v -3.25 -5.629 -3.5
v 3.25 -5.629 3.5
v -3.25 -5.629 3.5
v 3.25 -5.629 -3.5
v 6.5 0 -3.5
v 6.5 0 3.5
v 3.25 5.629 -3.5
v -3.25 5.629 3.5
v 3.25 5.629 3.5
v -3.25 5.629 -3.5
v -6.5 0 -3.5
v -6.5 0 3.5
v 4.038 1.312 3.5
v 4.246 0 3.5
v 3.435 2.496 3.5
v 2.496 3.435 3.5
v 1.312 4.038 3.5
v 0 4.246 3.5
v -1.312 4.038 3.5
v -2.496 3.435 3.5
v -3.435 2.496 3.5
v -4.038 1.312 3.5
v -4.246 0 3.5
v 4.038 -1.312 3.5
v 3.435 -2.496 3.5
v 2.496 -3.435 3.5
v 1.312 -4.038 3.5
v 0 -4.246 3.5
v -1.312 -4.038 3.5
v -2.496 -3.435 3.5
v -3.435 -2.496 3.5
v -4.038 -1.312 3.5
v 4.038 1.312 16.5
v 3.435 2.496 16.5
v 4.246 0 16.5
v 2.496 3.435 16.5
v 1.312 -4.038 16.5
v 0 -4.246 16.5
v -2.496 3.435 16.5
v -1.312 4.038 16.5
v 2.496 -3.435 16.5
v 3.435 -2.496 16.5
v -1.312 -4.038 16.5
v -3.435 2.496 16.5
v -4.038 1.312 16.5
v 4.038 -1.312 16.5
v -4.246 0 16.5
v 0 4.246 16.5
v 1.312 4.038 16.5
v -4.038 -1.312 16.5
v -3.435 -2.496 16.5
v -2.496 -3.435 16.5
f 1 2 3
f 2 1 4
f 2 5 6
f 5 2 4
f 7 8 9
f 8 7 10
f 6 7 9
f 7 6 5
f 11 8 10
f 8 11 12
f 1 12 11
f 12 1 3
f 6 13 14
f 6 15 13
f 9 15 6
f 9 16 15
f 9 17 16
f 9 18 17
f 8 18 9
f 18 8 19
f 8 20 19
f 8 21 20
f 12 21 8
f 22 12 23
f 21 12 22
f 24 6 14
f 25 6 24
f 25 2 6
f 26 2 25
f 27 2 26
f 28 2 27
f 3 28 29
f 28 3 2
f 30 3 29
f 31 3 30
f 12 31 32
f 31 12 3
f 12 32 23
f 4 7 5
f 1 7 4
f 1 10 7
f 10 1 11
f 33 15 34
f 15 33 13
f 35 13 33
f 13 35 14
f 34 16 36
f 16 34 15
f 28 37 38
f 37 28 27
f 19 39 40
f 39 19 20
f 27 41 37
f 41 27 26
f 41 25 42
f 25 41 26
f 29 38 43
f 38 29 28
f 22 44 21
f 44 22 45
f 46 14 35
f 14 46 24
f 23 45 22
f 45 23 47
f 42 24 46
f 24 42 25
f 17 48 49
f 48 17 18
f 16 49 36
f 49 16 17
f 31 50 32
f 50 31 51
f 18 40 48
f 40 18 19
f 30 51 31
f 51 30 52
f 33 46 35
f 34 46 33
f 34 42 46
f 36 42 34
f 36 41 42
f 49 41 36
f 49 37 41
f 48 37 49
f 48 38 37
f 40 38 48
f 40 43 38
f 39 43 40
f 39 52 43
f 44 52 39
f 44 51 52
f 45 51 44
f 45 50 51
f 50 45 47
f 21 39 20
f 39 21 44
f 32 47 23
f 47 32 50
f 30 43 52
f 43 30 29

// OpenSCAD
//Author: Piotr Paterek, Kraków 05-08.2016
cylinder(r=6.5,h=7,$fn=6, center=true);
translate([0,0,10])
{
    cylinder(r=4.246,h=13,$fn=20, center=true);
}
